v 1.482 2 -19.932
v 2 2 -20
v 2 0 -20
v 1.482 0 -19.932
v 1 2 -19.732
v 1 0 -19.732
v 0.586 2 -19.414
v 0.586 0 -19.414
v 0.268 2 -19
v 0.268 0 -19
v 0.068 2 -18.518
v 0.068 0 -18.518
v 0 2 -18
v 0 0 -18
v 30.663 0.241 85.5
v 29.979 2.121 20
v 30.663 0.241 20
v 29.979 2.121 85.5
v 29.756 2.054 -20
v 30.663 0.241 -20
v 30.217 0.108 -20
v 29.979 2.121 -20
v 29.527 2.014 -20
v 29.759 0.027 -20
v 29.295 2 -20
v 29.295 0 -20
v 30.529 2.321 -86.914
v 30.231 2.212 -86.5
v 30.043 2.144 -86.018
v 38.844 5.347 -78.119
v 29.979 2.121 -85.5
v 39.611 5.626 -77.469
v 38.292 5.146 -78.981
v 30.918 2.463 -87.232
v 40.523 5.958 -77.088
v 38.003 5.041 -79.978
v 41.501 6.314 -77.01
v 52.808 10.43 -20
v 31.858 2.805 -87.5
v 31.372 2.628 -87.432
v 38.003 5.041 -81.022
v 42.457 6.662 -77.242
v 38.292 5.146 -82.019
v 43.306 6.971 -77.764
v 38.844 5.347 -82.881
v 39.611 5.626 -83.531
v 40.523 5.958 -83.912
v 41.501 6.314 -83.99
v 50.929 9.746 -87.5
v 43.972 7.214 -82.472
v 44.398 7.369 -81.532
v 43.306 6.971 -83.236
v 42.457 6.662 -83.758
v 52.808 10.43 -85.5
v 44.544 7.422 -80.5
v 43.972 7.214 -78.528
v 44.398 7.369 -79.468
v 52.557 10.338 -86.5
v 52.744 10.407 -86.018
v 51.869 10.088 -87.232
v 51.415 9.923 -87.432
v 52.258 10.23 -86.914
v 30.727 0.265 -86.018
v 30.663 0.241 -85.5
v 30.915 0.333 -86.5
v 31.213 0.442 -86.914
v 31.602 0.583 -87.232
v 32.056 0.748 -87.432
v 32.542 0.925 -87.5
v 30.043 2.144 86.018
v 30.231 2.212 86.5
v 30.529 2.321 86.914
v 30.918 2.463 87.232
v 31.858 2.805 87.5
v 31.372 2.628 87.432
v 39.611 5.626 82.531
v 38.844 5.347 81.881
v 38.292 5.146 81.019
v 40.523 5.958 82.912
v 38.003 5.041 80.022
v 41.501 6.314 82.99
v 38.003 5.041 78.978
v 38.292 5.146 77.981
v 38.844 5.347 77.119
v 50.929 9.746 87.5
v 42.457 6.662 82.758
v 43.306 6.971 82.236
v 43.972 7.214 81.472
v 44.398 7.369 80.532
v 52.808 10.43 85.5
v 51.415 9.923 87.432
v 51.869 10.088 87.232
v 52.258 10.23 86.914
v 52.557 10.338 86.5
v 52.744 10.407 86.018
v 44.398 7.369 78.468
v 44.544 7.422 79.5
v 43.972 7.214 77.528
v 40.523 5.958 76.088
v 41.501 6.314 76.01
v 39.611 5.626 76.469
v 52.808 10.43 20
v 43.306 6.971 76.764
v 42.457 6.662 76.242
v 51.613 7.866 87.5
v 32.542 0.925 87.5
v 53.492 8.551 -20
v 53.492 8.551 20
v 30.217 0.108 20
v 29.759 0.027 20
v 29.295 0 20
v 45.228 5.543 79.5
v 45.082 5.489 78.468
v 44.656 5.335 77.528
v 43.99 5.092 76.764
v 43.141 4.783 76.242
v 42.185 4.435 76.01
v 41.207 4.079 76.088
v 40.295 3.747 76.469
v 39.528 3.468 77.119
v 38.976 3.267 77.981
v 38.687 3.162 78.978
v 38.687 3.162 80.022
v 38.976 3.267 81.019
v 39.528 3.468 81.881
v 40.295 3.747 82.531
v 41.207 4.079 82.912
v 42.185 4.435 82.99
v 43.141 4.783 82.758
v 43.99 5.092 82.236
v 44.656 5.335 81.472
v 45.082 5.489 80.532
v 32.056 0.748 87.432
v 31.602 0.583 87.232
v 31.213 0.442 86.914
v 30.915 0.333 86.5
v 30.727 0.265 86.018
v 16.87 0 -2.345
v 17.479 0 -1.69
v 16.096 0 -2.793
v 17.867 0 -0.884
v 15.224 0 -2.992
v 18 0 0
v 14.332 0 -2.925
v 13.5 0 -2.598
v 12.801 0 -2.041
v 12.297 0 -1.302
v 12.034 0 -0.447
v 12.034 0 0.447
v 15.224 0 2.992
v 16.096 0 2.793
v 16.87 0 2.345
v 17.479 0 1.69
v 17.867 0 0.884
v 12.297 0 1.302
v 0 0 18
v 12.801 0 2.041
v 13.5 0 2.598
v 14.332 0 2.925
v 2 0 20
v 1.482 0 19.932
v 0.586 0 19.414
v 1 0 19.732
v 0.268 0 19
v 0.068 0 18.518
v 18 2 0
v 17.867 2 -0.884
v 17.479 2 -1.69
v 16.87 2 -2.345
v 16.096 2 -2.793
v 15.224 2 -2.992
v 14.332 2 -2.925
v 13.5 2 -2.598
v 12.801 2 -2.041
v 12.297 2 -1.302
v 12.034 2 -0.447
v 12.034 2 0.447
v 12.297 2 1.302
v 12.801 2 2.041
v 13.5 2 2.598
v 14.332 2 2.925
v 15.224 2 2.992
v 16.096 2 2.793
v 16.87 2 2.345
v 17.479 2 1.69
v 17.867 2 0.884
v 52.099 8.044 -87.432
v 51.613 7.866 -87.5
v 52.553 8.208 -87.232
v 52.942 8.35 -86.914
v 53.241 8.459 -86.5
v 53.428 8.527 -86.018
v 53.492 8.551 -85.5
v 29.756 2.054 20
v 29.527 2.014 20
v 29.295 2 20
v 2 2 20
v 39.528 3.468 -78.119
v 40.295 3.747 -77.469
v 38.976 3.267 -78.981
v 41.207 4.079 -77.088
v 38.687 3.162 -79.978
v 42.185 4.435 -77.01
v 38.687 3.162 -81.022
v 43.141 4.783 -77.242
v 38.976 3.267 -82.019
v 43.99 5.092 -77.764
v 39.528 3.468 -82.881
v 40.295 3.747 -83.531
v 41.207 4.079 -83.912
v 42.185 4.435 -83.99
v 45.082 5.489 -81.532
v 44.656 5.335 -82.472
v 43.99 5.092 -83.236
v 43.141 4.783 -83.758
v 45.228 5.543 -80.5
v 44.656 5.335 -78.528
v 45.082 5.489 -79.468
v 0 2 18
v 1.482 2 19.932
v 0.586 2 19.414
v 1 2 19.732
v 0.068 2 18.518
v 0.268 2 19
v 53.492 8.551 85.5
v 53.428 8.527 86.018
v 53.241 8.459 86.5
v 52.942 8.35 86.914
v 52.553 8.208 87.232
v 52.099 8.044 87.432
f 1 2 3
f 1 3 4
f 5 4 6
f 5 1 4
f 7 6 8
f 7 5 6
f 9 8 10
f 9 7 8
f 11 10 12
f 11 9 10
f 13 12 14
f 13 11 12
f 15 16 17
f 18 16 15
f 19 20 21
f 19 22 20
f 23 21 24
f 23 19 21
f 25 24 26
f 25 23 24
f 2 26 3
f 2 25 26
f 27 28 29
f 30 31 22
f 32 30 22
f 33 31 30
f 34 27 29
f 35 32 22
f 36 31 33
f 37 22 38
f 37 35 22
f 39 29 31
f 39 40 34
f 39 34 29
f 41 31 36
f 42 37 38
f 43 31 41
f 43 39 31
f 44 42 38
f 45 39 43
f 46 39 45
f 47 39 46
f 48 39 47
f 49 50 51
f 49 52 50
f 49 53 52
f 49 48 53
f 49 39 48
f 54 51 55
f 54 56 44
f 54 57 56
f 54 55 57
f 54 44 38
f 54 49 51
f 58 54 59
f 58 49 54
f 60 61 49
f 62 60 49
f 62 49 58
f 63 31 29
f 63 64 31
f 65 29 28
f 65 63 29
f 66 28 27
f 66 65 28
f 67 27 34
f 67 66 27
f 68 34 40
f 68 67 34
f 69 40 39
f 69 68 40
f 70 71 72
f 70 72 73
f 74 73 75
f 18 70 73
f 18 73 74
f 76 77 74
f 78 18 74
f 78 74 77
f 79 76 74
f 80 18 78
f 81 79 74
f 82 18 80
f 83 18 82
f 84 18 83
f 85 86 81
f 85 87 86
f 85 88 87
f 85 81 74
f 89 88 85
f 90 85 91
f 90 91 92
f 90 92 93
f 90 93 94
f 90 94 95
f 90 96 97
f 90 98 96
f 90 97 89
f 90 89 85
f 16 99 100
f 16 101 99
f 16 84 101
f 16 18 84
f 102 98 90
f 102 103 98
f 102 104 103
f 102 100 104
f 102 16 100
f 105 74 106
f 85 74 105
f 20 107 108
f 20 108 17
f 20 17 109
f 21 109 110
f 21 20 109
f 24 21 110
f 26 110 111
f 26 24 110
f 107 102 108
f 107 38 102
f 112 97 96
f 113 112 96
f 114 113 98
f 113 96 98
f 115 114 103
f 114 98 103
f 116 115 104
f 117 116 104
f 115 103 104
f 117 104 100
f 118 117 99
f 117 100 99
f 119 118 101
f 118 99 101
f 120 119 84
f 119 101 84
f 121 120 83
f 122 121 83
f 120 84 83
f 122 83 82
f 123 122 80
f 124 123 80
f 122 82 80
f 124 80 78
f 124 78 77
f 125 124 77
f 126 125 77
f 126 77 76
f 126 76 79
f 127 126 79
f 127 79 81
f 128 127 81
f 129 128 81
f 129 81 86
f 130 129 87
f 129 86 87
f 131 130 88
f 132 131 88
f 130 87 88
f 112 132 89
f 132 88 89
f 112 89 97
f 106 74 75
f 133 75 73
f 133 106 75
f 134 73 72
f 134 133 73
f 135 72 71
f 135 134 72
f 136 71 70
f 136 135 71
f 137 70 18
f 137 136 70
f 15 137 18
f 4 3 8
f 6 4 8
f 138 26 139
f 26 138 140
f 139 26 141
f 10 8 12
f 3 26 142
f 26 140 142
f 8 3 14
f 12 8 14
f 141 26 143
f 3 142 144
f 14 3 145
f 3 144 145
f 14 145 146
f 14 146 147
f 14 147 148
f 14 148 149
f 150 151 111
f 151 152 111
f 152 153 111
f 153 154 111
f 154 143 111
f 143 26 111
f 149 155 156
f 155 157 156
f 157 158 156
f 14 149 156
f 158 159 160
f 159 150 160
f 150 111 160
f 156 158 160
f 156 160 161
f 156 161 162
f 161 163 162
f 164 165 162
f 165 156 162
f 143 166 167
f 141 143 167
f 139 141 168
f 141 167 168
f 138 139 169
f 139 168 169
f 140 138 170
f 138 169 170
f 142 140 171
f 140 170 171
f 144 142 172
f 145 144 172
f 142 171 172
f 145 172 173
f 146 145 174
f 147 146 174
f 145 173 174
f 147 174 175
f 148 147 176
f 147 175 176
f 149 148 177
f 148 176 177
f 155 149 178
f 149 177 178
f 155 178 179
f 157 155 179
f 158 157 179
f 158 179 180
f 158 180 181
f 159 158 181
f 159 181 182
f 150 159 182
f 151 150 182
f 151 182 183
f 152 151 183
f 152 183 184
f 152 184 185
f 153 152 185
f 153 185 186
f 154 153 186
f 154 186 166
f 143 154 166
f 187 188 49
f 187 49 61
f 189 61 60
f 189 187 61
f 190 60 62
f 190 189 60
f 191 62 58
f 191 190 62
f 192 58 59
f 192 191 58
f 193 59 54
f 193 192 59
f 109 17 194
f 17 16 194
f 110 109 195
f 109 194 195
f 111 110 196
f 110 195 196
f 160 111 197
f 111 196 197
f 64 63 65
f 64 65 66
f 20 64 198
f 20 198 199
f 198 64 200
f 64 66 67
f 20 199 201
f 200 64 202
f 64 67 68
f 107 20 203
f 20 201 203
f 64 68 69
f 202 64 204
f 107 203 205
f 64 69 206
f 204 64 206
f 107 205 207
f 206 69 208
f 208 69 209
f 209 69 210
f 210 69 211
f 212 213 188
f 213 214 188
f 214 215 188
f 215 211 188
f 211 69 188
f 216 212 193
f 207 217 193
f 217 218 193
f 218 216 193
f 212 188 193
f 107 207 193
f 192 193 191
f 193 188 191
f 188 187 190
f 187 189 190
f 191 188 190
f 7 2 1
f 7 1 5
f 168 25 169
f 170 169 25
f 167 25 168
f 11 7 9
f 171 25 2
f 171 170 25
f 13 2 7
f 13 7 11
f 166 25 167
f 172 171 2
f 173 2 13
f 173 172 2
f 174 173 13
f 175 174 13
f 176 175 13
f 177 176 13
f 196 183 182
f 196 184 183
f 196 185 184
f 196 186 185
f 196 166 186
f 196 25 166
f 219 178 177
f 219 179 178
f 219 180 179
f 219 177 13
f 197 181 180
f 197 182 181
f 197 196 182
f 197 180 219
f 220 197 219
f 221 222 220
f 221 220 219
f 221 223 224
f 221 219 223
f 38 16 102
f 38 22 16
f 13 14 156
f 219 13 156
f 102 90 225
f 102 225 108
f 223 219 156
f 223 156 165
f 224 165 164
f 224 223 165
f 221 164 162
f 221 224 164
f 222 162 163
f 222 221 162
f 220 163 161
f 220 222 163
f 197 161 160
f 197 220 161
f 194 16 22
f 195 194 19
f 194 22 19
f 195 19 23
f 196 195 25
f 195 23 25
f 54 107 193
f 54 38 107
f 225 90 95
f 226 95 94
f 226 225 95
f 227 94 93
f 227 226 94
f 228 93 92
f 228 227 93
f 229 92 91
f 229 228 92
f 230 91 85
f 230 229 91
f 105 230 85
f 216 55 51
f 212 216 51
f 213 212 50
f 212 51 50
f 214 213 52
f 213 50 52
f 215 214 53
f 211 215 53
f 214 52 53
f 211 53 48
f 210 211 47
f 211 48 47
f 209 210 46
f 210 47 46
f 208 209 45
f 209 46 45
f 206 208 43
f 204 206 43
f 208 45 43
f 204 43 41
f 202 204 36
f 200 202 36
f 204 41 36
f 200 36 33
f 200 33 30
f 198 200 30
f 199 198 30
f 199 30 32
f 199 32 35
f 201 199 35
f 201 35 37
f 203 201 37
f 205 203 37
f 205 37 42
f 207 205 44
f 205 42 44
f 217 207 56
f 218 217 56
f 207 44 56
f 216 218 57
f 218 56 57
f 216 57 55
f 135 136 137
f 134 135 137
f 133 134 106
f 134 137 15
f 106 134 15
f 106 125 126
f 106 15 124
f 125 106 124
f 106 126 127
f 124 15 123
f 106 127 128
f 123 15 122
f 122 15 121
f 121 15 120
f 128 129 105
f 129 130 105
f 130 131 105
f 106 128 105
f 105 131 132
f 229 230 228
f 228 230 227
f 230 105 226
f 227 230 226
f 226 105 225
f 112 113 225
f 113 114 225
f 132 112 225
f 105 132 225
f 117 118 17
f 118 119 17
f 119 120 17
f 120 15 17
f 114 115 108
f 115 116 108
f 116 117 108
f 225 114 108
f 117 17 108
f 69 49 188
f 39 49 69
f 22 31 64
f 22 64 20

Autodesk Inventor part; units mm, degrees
ref_plane "YZ Plane" through (0, 0, 0) normal (1, 0, 0) x (0, 1, 0)
ref_plane "XZ Plane" through (0, 0, 0) normal (0, 1, 0) x (-1, 0, 0)
ref_plane "XY Plane" through (0, 0, 0) normal (0, 0, 1) x (1, 0, 0)
sketch "Sketch1" plane through (0, 0, 0) normal (0, 1, 0) x (-1, 0, 0)
  line L0 (0, 20) -> (-30, 20)
  line L1 (-30, 20) -> (-30, -20)
  line L2 (-30, -20) -> (0, -20)
  line L3 (0, -20) -> (0, 20)
  point P0 (0, 0)
  dimension "d0" = 20
  dimension "d1" = 20
  dimension "d2" = 0
  dimension "d3" = 30
extrude "Plate1" add sketch "Sketch1" along normal blind 2
sketch "Sketch3" plane through (29.316, 1.8794, -20) normal (0.3420201, -0.9396926, 0) x (0.9396926, 0.3420201, 0)
  line L0 (0, 40) -> (0, 0)
  line L1 (0, 0) -> (25, 0)
  line L2 (25, 0) -> (25, 40)
  line L3 (25, 40) -> (0, 40)
edge flange "Flange1" height 25 angle 20 thickness 2 bend radius 2 thickness toward (0.3420201, -0.9396926, 0) relief tear relief width 2 relief depth 1 edges at (30, 2, 0) wall of the first edge with corners at (29.316, 1.8794, 20) (29.316, 1.8794, -20) (52.8083, 10.4299, -20) (52.8083, 10.4299, 20)
bend "Bend1"
corner "Corner1"
sketch "Sketch4" plane through (52.8083, 10.4299, 20) normal (-0.3420201, 0.9396926, 0) x (0.9396926, 0.3420201, 0)
  line L0 (-24.2947, 40) -> (-24.2947, 0) projected
  line L1 (-24.2947, 0) -> (0, 0) projected
  line L2 (0, 0) -> (0, 40) projected
  line L3 (-24.2947, 40) -> (0, 40) projected
  line L4 (-24.2947, -67.5) -> (0, -67.5)
  line L5 (0, -67.5) -> (0, 107.5)
  line L6 (0, 107.5) -> (-24.2947, 107.5)
  line L7 (-24.2947, 107.5) -> (-24.2947, -67.5)
  point P0 (-53.1908, 20)
  dimension "d19" = 67.5
  dimension "d20" = 67.5
  dimension "d21" = 0
  dimension "d22" = 0
extrude "Extrusion1" add sketch "Sketch4" against normal blind 2 contours L7 L6 L5 L3 | L1 L5 L4 L7
fillet "Fillet1" radius 2 2 edges at (0, 1, 20) (0, 1, -20)
fillet "Fillet2" radius 2 4 edges at (30.3208, 1.1809, 87.5) (53.1503, 9.4902, 87.5) (53.1503, 9.4902, -87.5) (30.3208, 1.1809, -87.5)
sketch "Sketch5" plane through (0, 2, 0) normal (0, 1, 0) x (1, 0, 0)
  circle A0 centre (15, 0) radius 3
  point P0 (0, 0)
  dimension "d44" = 6
  dimension "d45" = 15
  dimension "d46" = 0
extrude "Extrusion2" cut sketch "Sketch5" against normal blind 2
sketch "Sketch6" plane through (29.9787, 2.1206, 20) normal (-0.3420201, 0.9396926, 0) x (0.9396926, 0.3420201, 0)
  circle A0 centre (12, -59.5) radius 3.5
  arc A1 (2, 107.5) -> (0, 105.5) centre (2, 105.5) ccw projected
  line L0 (0, 105.5) -> (0, 40) projected
  line L1 (0, 40) -> (0, 0) projected
  line L2 (0, 0) -> (0, -65.5) projected
  arc A2 (0, -65.5) -> (2, -67.5) centre (2, -65.5) ccw projected
  line L3 (2, -67.5) -> (22.2947, -67.5) projected
  arc A3 (22.2947, -67.5) -> (24.2947, -65.5) centre (22.2947, -65.5) ccw projected
  line L4 (24.2947, -65.5) -> (24.2947, 105.5) projected
  arc A4 (24.2947, 105.5) -> (22.2947, 107.5) centre (22.2947, 105.5) ccw projected
  line L5 (22.2947, 107.5) -> (2, 107.5) projected
  circle A5 centre (12, 100.5) radius 3.5
  point P0 (-28.8961, 20)
  dimension "d32" = 7
  dimension "d35" = 160
  dimension "d40" = 8
  dimension "d41" = 12
extrude "Extrusion3" cut sketch "Sketch6" against normal blind 2 contours A0 | A5
equation "\"d20\" = d19"
equation "\"d1\" = d0"
equation "\"BendRadius\" = Thickness"
equation "\"BendReliefWidth\" = Thickness"
equation "\"BendReliefDepth\" = 0.5 * Thickness"
equation "\"CornerReliefSize\" = 4 * Thickness"
equation "\"MinimumRemnant\" = 2 * Thickness"
equation "\"TransitionRadius\" = BendRadius"
equation "\"JacobiRadiusSize\" = BendRadius"
equation "\"GapSize\" = Thickness"
properties part number "Top Mount" material "Stainless Steel"
